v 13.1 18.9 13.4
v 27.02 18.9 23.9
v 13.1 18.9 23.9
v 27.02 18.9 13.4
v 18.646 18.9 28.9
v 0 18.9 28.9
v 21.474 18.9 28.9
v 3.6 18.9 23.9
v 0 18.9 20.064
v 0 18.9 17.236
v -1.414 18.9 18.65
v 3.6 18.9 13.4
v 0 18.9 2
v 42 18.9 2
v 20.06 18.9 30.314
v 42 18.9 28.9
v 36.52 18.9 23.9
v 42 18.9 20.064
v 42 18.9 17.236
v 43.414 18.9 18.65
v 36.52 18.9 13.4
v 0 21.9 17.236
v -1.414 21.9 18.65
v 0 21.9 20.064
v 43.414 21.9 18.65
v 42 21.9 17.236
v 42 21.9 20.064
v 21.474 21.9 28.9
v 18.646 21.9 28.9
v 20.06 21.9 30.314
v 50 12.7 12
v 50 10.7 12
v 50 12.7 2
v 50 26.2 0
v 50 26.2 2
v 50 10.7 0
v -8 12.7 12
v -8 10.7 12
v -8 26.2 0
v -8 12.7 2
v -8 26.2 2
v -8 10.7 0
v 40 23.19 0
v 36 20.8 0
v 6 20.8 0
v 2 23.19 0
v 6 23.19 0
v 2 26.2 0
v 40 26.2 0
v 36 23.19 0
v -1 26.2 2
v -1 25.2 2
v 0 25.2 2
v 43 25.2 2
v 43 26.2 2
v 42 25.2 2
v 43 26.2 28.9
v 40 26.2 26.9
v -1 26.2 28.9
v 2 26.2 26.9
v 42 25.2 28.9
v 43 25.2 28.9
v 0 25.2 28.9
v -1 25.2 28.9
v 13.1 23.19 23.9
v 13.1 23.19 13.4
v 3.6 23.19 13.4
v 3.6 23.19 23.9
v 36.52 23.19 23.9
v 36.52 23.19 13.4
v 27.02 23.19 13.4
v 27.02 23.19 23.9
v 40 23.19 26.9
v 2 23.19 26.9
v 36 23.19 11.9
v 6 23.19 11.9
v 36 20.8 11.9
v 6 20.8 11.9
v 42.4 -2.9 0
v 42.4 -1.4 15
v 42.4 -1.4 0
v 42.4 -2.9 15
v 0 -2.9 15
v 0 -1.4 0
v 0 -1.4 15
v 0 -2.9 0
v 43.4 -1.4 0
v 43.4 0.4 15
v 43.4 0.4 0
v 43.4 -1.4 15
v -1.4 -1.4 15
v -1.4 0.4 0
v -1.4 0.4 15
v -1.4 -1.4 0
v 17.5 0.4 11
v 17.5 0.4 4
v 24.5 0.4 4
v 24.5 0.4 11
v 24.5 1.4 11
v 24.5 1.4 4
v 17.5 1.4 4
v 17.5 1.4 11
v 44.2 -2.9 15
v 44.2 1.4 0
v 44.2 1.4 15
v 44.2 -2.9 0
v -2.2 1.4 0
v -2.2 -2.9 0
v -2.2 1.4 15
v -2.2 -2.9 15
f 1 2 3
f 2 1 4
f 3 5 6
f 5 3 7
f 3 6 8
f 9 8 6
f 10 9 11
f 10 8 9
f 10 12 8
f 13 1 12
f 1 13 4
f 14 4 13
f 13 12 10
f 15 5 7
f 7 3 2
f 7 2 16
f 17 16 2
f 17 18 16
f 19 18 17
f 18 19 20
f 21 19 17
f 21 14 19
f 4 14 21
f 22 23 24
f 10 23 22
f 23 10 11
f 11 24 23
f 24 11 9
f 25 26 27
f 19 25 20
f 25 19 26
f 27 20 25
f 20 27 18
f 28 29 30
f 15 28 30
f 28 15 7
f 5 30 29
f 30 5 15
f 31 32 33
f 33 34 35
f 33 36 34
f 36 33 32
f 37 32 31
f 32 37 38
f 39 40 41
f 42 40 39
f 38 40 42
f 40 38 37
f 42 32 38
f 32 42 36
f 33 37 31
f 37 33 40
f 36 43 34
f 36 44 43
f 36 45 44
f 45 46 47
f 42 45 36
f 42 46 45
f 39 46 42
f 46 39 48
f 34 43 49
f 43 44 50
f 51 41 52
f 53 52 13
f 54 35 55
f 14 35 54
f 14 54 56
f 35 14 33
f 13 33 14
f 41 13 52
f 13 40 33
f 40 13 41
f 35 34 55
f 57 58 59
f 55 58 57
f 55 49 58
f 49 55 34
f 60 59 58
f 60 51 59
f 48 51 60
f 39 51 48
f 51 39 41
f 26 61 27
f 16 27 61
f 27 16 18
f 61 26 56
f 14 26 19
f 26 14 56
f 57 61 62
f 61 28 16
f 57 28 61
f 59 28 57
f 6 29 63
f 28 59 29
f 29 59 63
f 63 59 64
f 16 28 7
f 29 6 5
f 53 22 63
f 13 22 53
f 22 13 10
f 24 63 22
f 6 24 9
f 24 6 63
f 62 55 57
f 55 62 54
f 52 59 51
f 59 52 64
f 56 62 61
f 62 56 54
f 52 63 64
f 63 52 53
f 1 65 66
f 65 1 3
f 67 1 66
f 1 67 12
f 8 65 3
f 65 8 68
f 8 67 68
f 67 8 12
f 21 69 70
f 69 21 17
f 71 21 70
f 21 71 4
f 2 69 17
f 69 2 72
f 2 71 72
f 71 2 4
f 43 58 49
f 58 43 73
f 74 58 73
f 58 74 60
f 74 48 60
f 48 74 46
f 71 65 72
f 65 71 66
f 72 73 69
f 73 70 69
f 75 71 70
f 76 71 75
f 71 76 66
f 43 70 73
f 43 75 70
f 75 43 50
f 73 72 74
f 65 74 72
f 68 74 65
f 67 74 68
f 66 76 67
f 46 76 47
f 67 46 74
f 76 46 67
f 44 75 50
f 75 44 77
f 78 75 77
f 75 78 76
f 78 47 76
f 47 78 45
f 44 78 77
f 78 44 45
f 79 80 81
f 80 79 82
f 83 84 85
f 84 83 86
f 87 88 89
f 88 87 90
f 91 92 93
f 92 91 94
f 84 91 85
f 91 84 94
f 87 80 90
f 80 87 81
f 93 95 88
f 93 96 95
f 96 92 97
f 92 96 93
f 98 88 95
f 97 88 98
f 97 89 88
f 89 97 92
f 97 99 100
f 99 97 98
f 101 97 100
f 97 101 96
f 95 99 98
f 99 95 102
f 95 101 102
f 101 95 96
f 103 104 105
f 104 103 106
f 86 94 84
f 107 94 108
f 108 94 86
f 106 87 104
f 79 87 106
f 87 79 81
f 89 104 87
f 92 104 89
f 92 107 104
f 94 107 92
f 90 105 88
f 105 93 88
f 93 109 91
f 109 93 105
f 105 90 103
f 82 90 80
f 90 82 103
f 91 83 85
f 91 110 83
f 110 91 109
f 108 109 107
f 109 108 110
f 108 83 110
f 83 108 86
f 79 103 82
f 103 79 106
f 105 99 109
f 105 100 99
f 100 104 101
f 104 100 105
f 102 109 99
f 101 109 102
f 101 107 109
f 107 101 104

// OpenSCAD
/*
* Open3DOLED is licensed under CC BY-NC-SA 4.0. To view a copy of this license, visit http://creativecommons.org/licenses/by-nc-sa/4.0/
*/

/*
*
* 3D IR Emitter Mount V1.1
*
* Version 0101a: first attempt
* Version 0101b: lots of changes
* Version 0101c: added optional spacer for ir cut filter 10x10x0.55mm https://www.aliexpress.com/item/1005002502760553.html
* Version 0101e: revised ir cut filter to be on inside with no adhesive and minimal black backing
* Version 0101d: added alignment markers for calibration assistance mode
* 
* Todo:
*  - 
* 
* Notes:
*  - 
*
*/

ovr = 0.01;

// Screen bezel to pixel height dimension
// 11 mm - LG C1 OLED and Sony XBR-48A9S Bezel Only
// 14 mm - LG C1 OLED and MMK 55MBL-EL Screen protector
// 7 mm - LG G3 OLED Bezel Only
// 9 mm - Sony X95K MiniLED
tv_top_bezel_to_pixel_wz = 11;

// Screen bezel thickness dimensions 
// 4.7 mm - LG C1 OLED Bezel Only (measured 4.4 mm)
// 6.2 mm - LG C1 OLED with felt (back and front)
// 29 mm - LG C1 OLED and MMK 55MBL-EL Screen protector
// 30 mm - LG C1 OLED and MMK 55MBL-EL Screen protector with felt
// 5.5 mm - Sony XBR-48A9S Bezel Only
// 13.5 mm - LG G3 OLED Bezel Only
// 15.0 mm - LG G3 OLED Bezel Only with felt (back and front)
// 32 mm - Sony X95K MiniLED (it has a rounded back so I've made it a little larger than what looks like 30mm any extra can be filled with spacers)
mm_r_wy = 6.2;

// Mount Ridge Ledge Height
// 10 mm - Most sets with a flat back that goes down > 10 mm from the top
// 20 mm - Sony X95K MiniLED (has a curved back for the first 10 mm)
mm_rl_wz = 10;

tv_top_wz = tv_top_bezel_to_pixel_wz+4.5; // we add 4.5 mm for optional faded board to help prevent potential burn-in

pcb_wx = 38; // measured 37.63
pcb_wz = 60; // measured 59.03
pcb_wy = 1.4;
pcb_wy_pkt = 3; // deep enough to hold the pcb board firmly but not soo deep as to hit the connector pins measured 3.4 with solder stubs sticking out
pcb_wb = 2; // plastic board thickness surrounding pcb
// pocket for solder stubs
pcb_p_px = 4;
pcb_p_wx = pcb_wx - 2*pcb_p_px;
pcb_p_wy = 2.4; // measured 4.0 minus 1.6 pcb depth
pcb_p_wz = 13; // height of pocket
pcb_p_sz = 1.5; // space between pocket and opt-101 top
// plastic back behind pcb that sticks above to screw into
pcb_b = false;
pcb_b_wy = 4; 
pcb_b_wz = pcb_wz + 2 * pcb_wb;
// plastic ridges on side to clip brace bracket onto
pcb_r = true;
pcb_r_wy = 1;
pcb_r_wx = 1;


// opt sensor (chip)
os_s_wx = 22.86; // measured 22.86 on pcbnew opt-101 center-to-center chip spacing
os_c_px_1 = 6.35; // measured 6.35 on pcbnew opt-101 left chip center from left edge
os_c_px_2 = 8.23; // measured 6.35 on pcbnew opt-101 left chip center from right edge
os_c_wx = 9.5; // measured 8 at top and 9 at bottom with solder bulge
os_c_wy = 4.3; // measured 4.5
os_c_wz = 10.5; // measured 10
os_c_pz_1 = 3; // measured 2.5 distance of opt sensor from bottom of pcb
os_c_pz_2 = pcb_wz - os_c_pz_1 - os_c_wz; // space below chip
os_c_pz_3 = (os_c_wz - 2.3) / 2; // photodiode is 2.3mm square (this is used to offset the photodiode to the edge of the screen for minimum obstruction)

// opt sensor ir cut filter mount
use_irf = false;
os_irf_s_wx = 6.0;
os_irf_s_wy = 0.9;
os_irf_s_wz = 6.0;
os_irf_s_rpx = (os_c_wx-os_irf_s_wx)/2;
os_irf_s_rpz = (os_c_wz-os_irf_s_wz)/2;
os_irf_wx = 10.5; // might need to be 11.0 depending on printer accuracy
os_irf_wy = 0.9;
os_irf_wz = 10.5; // might need to be 11.0 depending on printer accuracy
os_irf_rpx = (os_c_wx-os_irf_wx)/2;
os_irf_rpz = (os_c_wz-os_irf_wz)/2;

// mount top (ridge) (ridge ledge)

mm_wx = pcb_wx + 2*pcb_wb;
mm_wy = pcb_wy_pkt + os_c_wy + (use_irf ? os_irf_s_wy + os_irf_wy : 0);
mm_wz = tv_top_wz - os_c_pz_2 - os_c_pz_3 + pcb_wz + pcb_wb;
mm_r_px = 8;
mm_r_wx = mm_wx + 2*mm_r_px;
mm_r_wz = 2;
mm_rl_wy = 2;

// alignment markings
pcb_am = true;
pcb_am_wy = 3;
pcb_am_wxz = 2;
pcb_am3_px_off = os_c_px_1-os_c_px_2; // offset of center alignment marker to match center of opt sensors.

module 3d_player_tv_mount_main () {
  difference() {
    union() {
      translate([-mm_r_px, mm_wy+mm_r_wy, -mm_rl_wz])
      cube([mm_r_wx, mm_rl_wy, mm_rl_wz+ovr]);
      translate([-mm_r_px,0, 0])
      cube([mm_r_wx, mm_wy+mm_r_wy+mm_rl_wy, mm_r_wz]);
      translate([0,0,-mm_wz])
      cube([mm_wx, mm_wy, mm_wz+ovr]);
      if (pcb_b) {
        translate([0,0,-mm_wz])
        cube([mm_wx, pcb_b_wy, pcb_b_wz+ovr]);
      }
      if (pcb_r) {
        translate([-pcb_r_wx,0,-mm_wz])
        cube([pcb_wx+2*pcb_wb+2*pcb_r_wx, pcb_r_wy, mm_wz+ovr]);
      }
      if (pcb_am) {
        for (pxpz = [[0,os_c_pz_2+os_c_pz_3-tv_top_wz-pcb_wz+os_c_pz_1+os_c_wz/2], [pcb_wx+2*pcb_wb,os_c_pz_2+os_c_pz_3-tv_top_wz-pcb_wz+os_c_pz_1+os_c_wz/2], [(pcb_wx+2*pcb_wb+pcb_am3_px_off)/2,-mm_wz]]) {
          translate([pxpz[0],mm_wy-pcb_am_wy,pxpz[1]])
          rotate([0,45,0])
          translate([-pcb_am_wxz/2,0,-pcb_am_wxz/2])
          cube([pcb_am_wxz, pcb_am_wy, pcb_am_wxz]);
        }
      }
    }
    union() {
      echo(os_c_pz_1+os_c_wz+2);
      translate([pcb_wb, -ovr, os_c_pz_2 + os_c_pz_3 - tv_top_wz - pcb_wz])
      cube([pcb_wx,pcb_wy_pkt+2*ovr,pcb_wz]);
      translate([pcb_wb+pcb_p_px, pcb_wy_pkt-ovr, os_c_pz_2 + os_c_pz_3 - tv_top_wz - pcb_wz + os_c_pz_1+os_c_wz+pcb_p_sz ])
      cube([pcb_p_wx,pcb_p_wy+ovr,pcb_p_wz]);
      translate([0, -ovr, os_c_pz_2 + os_c_pz_3 - tv_top_wz - pcb_wz])
      union() {
        for (px = [pcb_wb+os_c_px_1-os_c_wx/2, pcb_wb+pcb_wx-os_c_px_2-os_c_wx/2]) {
          if (use_irf) {
            translate([px-(os_irf_wx-os_c_wx)/2,pcb_wy_pkt,os_c_pz_1-(os_irf_wz-os_c_wz)/2])
            cube([os_irf_wx,os_c_wy+os_irf_wy+2*ovr,os_irf_wz]); // opt101 hole
            translate([px+os_irf_s_rpx,pcb_wy_pkt+os_c_wy+os_irf_wy,os_c_pz_1+os_irf_s_rpz])
            cube([os_irf_s_wx,os_irf_s_wy+2*ovr,os_irf_s_wz]); // opt101 hole above chip
          }
          else {
            translate([px,pcb_wy_pkt,os_c_pz_1])
            cube([os_c_wx,os_c_wy+2*ovr,os_c_wz]); // opt101 hole
          }
        }
      }
    }
  }
}

mb_wc = 1.0; // width of clip needs to bend slightly
mb_tf = 0.8; // tension factor on ridges
mb_wx = mm_wx + 2 * mb_tf * pcb_r_wx + 2 * mb_wc;
mb_wz = 13+pcb_wb; // measured 11.0
mb_px = - mb_tf * pcb_r_wx - mb_wc;
mb_c_wy = 3.5; // clip depth
mb_c_wt = 0.4; // tolerances on clip to mating side
mb_c_wt_s = 0.2; // tolerances on clip gripping part
mb_rb_wx = 7; // reset button
mb_rb_wz = 7; // reset button
mb_rb_pz = 7.5; // measured 6.5

module 3d_player_tv_mount_bracket () {
  difference() {
    union() {
      translate([mb_px-mb_c_wt,-mb_wc-mb_c_wt,-mm_wz+pcb_wb])
      cube([mb_wx+2*mb_c_wt, mb_c_wy+2*mb_c_wt, mb_wz]);
    }
    union() {
      translate([0,0,-mm_wz-ovr])
      cube([mm_wx+2*mb_c_wt_s, mm_wy, mm_wz+2*ovr]);
      translate([-pcb_r_wx-mb_c_wt,-mb_c_wt,-mm_wz-ovr])
      cube([pcb_wx+2*pcb_wb+2*pcb_r_wx+2*mb_c_wt, pcb_r_wy+2*mb_c_wt, mm_wz+2*ovr]);
      translate([pcb_wx/2+pcb_wb-mb_rb_wx/2, -mb_wc-mb_c_wt-ovr, -mm_wz+mb_rb_pz-mb_rb_wz/2+pcb_wb])
      cube([mb_rb_wx, mb_wc+2*ovr, mb_rb_wz]);
    }
  }
}


translate([0, mm_r_wy+20, mm_r_wz])
rotate([180,0,0])
3d_player_tv_mount_main();
translate([0, 0, mb_wz-mm_wz+pcb_wb])
rotate([180,0,0])
3d_player_tv_mount_bracket();
